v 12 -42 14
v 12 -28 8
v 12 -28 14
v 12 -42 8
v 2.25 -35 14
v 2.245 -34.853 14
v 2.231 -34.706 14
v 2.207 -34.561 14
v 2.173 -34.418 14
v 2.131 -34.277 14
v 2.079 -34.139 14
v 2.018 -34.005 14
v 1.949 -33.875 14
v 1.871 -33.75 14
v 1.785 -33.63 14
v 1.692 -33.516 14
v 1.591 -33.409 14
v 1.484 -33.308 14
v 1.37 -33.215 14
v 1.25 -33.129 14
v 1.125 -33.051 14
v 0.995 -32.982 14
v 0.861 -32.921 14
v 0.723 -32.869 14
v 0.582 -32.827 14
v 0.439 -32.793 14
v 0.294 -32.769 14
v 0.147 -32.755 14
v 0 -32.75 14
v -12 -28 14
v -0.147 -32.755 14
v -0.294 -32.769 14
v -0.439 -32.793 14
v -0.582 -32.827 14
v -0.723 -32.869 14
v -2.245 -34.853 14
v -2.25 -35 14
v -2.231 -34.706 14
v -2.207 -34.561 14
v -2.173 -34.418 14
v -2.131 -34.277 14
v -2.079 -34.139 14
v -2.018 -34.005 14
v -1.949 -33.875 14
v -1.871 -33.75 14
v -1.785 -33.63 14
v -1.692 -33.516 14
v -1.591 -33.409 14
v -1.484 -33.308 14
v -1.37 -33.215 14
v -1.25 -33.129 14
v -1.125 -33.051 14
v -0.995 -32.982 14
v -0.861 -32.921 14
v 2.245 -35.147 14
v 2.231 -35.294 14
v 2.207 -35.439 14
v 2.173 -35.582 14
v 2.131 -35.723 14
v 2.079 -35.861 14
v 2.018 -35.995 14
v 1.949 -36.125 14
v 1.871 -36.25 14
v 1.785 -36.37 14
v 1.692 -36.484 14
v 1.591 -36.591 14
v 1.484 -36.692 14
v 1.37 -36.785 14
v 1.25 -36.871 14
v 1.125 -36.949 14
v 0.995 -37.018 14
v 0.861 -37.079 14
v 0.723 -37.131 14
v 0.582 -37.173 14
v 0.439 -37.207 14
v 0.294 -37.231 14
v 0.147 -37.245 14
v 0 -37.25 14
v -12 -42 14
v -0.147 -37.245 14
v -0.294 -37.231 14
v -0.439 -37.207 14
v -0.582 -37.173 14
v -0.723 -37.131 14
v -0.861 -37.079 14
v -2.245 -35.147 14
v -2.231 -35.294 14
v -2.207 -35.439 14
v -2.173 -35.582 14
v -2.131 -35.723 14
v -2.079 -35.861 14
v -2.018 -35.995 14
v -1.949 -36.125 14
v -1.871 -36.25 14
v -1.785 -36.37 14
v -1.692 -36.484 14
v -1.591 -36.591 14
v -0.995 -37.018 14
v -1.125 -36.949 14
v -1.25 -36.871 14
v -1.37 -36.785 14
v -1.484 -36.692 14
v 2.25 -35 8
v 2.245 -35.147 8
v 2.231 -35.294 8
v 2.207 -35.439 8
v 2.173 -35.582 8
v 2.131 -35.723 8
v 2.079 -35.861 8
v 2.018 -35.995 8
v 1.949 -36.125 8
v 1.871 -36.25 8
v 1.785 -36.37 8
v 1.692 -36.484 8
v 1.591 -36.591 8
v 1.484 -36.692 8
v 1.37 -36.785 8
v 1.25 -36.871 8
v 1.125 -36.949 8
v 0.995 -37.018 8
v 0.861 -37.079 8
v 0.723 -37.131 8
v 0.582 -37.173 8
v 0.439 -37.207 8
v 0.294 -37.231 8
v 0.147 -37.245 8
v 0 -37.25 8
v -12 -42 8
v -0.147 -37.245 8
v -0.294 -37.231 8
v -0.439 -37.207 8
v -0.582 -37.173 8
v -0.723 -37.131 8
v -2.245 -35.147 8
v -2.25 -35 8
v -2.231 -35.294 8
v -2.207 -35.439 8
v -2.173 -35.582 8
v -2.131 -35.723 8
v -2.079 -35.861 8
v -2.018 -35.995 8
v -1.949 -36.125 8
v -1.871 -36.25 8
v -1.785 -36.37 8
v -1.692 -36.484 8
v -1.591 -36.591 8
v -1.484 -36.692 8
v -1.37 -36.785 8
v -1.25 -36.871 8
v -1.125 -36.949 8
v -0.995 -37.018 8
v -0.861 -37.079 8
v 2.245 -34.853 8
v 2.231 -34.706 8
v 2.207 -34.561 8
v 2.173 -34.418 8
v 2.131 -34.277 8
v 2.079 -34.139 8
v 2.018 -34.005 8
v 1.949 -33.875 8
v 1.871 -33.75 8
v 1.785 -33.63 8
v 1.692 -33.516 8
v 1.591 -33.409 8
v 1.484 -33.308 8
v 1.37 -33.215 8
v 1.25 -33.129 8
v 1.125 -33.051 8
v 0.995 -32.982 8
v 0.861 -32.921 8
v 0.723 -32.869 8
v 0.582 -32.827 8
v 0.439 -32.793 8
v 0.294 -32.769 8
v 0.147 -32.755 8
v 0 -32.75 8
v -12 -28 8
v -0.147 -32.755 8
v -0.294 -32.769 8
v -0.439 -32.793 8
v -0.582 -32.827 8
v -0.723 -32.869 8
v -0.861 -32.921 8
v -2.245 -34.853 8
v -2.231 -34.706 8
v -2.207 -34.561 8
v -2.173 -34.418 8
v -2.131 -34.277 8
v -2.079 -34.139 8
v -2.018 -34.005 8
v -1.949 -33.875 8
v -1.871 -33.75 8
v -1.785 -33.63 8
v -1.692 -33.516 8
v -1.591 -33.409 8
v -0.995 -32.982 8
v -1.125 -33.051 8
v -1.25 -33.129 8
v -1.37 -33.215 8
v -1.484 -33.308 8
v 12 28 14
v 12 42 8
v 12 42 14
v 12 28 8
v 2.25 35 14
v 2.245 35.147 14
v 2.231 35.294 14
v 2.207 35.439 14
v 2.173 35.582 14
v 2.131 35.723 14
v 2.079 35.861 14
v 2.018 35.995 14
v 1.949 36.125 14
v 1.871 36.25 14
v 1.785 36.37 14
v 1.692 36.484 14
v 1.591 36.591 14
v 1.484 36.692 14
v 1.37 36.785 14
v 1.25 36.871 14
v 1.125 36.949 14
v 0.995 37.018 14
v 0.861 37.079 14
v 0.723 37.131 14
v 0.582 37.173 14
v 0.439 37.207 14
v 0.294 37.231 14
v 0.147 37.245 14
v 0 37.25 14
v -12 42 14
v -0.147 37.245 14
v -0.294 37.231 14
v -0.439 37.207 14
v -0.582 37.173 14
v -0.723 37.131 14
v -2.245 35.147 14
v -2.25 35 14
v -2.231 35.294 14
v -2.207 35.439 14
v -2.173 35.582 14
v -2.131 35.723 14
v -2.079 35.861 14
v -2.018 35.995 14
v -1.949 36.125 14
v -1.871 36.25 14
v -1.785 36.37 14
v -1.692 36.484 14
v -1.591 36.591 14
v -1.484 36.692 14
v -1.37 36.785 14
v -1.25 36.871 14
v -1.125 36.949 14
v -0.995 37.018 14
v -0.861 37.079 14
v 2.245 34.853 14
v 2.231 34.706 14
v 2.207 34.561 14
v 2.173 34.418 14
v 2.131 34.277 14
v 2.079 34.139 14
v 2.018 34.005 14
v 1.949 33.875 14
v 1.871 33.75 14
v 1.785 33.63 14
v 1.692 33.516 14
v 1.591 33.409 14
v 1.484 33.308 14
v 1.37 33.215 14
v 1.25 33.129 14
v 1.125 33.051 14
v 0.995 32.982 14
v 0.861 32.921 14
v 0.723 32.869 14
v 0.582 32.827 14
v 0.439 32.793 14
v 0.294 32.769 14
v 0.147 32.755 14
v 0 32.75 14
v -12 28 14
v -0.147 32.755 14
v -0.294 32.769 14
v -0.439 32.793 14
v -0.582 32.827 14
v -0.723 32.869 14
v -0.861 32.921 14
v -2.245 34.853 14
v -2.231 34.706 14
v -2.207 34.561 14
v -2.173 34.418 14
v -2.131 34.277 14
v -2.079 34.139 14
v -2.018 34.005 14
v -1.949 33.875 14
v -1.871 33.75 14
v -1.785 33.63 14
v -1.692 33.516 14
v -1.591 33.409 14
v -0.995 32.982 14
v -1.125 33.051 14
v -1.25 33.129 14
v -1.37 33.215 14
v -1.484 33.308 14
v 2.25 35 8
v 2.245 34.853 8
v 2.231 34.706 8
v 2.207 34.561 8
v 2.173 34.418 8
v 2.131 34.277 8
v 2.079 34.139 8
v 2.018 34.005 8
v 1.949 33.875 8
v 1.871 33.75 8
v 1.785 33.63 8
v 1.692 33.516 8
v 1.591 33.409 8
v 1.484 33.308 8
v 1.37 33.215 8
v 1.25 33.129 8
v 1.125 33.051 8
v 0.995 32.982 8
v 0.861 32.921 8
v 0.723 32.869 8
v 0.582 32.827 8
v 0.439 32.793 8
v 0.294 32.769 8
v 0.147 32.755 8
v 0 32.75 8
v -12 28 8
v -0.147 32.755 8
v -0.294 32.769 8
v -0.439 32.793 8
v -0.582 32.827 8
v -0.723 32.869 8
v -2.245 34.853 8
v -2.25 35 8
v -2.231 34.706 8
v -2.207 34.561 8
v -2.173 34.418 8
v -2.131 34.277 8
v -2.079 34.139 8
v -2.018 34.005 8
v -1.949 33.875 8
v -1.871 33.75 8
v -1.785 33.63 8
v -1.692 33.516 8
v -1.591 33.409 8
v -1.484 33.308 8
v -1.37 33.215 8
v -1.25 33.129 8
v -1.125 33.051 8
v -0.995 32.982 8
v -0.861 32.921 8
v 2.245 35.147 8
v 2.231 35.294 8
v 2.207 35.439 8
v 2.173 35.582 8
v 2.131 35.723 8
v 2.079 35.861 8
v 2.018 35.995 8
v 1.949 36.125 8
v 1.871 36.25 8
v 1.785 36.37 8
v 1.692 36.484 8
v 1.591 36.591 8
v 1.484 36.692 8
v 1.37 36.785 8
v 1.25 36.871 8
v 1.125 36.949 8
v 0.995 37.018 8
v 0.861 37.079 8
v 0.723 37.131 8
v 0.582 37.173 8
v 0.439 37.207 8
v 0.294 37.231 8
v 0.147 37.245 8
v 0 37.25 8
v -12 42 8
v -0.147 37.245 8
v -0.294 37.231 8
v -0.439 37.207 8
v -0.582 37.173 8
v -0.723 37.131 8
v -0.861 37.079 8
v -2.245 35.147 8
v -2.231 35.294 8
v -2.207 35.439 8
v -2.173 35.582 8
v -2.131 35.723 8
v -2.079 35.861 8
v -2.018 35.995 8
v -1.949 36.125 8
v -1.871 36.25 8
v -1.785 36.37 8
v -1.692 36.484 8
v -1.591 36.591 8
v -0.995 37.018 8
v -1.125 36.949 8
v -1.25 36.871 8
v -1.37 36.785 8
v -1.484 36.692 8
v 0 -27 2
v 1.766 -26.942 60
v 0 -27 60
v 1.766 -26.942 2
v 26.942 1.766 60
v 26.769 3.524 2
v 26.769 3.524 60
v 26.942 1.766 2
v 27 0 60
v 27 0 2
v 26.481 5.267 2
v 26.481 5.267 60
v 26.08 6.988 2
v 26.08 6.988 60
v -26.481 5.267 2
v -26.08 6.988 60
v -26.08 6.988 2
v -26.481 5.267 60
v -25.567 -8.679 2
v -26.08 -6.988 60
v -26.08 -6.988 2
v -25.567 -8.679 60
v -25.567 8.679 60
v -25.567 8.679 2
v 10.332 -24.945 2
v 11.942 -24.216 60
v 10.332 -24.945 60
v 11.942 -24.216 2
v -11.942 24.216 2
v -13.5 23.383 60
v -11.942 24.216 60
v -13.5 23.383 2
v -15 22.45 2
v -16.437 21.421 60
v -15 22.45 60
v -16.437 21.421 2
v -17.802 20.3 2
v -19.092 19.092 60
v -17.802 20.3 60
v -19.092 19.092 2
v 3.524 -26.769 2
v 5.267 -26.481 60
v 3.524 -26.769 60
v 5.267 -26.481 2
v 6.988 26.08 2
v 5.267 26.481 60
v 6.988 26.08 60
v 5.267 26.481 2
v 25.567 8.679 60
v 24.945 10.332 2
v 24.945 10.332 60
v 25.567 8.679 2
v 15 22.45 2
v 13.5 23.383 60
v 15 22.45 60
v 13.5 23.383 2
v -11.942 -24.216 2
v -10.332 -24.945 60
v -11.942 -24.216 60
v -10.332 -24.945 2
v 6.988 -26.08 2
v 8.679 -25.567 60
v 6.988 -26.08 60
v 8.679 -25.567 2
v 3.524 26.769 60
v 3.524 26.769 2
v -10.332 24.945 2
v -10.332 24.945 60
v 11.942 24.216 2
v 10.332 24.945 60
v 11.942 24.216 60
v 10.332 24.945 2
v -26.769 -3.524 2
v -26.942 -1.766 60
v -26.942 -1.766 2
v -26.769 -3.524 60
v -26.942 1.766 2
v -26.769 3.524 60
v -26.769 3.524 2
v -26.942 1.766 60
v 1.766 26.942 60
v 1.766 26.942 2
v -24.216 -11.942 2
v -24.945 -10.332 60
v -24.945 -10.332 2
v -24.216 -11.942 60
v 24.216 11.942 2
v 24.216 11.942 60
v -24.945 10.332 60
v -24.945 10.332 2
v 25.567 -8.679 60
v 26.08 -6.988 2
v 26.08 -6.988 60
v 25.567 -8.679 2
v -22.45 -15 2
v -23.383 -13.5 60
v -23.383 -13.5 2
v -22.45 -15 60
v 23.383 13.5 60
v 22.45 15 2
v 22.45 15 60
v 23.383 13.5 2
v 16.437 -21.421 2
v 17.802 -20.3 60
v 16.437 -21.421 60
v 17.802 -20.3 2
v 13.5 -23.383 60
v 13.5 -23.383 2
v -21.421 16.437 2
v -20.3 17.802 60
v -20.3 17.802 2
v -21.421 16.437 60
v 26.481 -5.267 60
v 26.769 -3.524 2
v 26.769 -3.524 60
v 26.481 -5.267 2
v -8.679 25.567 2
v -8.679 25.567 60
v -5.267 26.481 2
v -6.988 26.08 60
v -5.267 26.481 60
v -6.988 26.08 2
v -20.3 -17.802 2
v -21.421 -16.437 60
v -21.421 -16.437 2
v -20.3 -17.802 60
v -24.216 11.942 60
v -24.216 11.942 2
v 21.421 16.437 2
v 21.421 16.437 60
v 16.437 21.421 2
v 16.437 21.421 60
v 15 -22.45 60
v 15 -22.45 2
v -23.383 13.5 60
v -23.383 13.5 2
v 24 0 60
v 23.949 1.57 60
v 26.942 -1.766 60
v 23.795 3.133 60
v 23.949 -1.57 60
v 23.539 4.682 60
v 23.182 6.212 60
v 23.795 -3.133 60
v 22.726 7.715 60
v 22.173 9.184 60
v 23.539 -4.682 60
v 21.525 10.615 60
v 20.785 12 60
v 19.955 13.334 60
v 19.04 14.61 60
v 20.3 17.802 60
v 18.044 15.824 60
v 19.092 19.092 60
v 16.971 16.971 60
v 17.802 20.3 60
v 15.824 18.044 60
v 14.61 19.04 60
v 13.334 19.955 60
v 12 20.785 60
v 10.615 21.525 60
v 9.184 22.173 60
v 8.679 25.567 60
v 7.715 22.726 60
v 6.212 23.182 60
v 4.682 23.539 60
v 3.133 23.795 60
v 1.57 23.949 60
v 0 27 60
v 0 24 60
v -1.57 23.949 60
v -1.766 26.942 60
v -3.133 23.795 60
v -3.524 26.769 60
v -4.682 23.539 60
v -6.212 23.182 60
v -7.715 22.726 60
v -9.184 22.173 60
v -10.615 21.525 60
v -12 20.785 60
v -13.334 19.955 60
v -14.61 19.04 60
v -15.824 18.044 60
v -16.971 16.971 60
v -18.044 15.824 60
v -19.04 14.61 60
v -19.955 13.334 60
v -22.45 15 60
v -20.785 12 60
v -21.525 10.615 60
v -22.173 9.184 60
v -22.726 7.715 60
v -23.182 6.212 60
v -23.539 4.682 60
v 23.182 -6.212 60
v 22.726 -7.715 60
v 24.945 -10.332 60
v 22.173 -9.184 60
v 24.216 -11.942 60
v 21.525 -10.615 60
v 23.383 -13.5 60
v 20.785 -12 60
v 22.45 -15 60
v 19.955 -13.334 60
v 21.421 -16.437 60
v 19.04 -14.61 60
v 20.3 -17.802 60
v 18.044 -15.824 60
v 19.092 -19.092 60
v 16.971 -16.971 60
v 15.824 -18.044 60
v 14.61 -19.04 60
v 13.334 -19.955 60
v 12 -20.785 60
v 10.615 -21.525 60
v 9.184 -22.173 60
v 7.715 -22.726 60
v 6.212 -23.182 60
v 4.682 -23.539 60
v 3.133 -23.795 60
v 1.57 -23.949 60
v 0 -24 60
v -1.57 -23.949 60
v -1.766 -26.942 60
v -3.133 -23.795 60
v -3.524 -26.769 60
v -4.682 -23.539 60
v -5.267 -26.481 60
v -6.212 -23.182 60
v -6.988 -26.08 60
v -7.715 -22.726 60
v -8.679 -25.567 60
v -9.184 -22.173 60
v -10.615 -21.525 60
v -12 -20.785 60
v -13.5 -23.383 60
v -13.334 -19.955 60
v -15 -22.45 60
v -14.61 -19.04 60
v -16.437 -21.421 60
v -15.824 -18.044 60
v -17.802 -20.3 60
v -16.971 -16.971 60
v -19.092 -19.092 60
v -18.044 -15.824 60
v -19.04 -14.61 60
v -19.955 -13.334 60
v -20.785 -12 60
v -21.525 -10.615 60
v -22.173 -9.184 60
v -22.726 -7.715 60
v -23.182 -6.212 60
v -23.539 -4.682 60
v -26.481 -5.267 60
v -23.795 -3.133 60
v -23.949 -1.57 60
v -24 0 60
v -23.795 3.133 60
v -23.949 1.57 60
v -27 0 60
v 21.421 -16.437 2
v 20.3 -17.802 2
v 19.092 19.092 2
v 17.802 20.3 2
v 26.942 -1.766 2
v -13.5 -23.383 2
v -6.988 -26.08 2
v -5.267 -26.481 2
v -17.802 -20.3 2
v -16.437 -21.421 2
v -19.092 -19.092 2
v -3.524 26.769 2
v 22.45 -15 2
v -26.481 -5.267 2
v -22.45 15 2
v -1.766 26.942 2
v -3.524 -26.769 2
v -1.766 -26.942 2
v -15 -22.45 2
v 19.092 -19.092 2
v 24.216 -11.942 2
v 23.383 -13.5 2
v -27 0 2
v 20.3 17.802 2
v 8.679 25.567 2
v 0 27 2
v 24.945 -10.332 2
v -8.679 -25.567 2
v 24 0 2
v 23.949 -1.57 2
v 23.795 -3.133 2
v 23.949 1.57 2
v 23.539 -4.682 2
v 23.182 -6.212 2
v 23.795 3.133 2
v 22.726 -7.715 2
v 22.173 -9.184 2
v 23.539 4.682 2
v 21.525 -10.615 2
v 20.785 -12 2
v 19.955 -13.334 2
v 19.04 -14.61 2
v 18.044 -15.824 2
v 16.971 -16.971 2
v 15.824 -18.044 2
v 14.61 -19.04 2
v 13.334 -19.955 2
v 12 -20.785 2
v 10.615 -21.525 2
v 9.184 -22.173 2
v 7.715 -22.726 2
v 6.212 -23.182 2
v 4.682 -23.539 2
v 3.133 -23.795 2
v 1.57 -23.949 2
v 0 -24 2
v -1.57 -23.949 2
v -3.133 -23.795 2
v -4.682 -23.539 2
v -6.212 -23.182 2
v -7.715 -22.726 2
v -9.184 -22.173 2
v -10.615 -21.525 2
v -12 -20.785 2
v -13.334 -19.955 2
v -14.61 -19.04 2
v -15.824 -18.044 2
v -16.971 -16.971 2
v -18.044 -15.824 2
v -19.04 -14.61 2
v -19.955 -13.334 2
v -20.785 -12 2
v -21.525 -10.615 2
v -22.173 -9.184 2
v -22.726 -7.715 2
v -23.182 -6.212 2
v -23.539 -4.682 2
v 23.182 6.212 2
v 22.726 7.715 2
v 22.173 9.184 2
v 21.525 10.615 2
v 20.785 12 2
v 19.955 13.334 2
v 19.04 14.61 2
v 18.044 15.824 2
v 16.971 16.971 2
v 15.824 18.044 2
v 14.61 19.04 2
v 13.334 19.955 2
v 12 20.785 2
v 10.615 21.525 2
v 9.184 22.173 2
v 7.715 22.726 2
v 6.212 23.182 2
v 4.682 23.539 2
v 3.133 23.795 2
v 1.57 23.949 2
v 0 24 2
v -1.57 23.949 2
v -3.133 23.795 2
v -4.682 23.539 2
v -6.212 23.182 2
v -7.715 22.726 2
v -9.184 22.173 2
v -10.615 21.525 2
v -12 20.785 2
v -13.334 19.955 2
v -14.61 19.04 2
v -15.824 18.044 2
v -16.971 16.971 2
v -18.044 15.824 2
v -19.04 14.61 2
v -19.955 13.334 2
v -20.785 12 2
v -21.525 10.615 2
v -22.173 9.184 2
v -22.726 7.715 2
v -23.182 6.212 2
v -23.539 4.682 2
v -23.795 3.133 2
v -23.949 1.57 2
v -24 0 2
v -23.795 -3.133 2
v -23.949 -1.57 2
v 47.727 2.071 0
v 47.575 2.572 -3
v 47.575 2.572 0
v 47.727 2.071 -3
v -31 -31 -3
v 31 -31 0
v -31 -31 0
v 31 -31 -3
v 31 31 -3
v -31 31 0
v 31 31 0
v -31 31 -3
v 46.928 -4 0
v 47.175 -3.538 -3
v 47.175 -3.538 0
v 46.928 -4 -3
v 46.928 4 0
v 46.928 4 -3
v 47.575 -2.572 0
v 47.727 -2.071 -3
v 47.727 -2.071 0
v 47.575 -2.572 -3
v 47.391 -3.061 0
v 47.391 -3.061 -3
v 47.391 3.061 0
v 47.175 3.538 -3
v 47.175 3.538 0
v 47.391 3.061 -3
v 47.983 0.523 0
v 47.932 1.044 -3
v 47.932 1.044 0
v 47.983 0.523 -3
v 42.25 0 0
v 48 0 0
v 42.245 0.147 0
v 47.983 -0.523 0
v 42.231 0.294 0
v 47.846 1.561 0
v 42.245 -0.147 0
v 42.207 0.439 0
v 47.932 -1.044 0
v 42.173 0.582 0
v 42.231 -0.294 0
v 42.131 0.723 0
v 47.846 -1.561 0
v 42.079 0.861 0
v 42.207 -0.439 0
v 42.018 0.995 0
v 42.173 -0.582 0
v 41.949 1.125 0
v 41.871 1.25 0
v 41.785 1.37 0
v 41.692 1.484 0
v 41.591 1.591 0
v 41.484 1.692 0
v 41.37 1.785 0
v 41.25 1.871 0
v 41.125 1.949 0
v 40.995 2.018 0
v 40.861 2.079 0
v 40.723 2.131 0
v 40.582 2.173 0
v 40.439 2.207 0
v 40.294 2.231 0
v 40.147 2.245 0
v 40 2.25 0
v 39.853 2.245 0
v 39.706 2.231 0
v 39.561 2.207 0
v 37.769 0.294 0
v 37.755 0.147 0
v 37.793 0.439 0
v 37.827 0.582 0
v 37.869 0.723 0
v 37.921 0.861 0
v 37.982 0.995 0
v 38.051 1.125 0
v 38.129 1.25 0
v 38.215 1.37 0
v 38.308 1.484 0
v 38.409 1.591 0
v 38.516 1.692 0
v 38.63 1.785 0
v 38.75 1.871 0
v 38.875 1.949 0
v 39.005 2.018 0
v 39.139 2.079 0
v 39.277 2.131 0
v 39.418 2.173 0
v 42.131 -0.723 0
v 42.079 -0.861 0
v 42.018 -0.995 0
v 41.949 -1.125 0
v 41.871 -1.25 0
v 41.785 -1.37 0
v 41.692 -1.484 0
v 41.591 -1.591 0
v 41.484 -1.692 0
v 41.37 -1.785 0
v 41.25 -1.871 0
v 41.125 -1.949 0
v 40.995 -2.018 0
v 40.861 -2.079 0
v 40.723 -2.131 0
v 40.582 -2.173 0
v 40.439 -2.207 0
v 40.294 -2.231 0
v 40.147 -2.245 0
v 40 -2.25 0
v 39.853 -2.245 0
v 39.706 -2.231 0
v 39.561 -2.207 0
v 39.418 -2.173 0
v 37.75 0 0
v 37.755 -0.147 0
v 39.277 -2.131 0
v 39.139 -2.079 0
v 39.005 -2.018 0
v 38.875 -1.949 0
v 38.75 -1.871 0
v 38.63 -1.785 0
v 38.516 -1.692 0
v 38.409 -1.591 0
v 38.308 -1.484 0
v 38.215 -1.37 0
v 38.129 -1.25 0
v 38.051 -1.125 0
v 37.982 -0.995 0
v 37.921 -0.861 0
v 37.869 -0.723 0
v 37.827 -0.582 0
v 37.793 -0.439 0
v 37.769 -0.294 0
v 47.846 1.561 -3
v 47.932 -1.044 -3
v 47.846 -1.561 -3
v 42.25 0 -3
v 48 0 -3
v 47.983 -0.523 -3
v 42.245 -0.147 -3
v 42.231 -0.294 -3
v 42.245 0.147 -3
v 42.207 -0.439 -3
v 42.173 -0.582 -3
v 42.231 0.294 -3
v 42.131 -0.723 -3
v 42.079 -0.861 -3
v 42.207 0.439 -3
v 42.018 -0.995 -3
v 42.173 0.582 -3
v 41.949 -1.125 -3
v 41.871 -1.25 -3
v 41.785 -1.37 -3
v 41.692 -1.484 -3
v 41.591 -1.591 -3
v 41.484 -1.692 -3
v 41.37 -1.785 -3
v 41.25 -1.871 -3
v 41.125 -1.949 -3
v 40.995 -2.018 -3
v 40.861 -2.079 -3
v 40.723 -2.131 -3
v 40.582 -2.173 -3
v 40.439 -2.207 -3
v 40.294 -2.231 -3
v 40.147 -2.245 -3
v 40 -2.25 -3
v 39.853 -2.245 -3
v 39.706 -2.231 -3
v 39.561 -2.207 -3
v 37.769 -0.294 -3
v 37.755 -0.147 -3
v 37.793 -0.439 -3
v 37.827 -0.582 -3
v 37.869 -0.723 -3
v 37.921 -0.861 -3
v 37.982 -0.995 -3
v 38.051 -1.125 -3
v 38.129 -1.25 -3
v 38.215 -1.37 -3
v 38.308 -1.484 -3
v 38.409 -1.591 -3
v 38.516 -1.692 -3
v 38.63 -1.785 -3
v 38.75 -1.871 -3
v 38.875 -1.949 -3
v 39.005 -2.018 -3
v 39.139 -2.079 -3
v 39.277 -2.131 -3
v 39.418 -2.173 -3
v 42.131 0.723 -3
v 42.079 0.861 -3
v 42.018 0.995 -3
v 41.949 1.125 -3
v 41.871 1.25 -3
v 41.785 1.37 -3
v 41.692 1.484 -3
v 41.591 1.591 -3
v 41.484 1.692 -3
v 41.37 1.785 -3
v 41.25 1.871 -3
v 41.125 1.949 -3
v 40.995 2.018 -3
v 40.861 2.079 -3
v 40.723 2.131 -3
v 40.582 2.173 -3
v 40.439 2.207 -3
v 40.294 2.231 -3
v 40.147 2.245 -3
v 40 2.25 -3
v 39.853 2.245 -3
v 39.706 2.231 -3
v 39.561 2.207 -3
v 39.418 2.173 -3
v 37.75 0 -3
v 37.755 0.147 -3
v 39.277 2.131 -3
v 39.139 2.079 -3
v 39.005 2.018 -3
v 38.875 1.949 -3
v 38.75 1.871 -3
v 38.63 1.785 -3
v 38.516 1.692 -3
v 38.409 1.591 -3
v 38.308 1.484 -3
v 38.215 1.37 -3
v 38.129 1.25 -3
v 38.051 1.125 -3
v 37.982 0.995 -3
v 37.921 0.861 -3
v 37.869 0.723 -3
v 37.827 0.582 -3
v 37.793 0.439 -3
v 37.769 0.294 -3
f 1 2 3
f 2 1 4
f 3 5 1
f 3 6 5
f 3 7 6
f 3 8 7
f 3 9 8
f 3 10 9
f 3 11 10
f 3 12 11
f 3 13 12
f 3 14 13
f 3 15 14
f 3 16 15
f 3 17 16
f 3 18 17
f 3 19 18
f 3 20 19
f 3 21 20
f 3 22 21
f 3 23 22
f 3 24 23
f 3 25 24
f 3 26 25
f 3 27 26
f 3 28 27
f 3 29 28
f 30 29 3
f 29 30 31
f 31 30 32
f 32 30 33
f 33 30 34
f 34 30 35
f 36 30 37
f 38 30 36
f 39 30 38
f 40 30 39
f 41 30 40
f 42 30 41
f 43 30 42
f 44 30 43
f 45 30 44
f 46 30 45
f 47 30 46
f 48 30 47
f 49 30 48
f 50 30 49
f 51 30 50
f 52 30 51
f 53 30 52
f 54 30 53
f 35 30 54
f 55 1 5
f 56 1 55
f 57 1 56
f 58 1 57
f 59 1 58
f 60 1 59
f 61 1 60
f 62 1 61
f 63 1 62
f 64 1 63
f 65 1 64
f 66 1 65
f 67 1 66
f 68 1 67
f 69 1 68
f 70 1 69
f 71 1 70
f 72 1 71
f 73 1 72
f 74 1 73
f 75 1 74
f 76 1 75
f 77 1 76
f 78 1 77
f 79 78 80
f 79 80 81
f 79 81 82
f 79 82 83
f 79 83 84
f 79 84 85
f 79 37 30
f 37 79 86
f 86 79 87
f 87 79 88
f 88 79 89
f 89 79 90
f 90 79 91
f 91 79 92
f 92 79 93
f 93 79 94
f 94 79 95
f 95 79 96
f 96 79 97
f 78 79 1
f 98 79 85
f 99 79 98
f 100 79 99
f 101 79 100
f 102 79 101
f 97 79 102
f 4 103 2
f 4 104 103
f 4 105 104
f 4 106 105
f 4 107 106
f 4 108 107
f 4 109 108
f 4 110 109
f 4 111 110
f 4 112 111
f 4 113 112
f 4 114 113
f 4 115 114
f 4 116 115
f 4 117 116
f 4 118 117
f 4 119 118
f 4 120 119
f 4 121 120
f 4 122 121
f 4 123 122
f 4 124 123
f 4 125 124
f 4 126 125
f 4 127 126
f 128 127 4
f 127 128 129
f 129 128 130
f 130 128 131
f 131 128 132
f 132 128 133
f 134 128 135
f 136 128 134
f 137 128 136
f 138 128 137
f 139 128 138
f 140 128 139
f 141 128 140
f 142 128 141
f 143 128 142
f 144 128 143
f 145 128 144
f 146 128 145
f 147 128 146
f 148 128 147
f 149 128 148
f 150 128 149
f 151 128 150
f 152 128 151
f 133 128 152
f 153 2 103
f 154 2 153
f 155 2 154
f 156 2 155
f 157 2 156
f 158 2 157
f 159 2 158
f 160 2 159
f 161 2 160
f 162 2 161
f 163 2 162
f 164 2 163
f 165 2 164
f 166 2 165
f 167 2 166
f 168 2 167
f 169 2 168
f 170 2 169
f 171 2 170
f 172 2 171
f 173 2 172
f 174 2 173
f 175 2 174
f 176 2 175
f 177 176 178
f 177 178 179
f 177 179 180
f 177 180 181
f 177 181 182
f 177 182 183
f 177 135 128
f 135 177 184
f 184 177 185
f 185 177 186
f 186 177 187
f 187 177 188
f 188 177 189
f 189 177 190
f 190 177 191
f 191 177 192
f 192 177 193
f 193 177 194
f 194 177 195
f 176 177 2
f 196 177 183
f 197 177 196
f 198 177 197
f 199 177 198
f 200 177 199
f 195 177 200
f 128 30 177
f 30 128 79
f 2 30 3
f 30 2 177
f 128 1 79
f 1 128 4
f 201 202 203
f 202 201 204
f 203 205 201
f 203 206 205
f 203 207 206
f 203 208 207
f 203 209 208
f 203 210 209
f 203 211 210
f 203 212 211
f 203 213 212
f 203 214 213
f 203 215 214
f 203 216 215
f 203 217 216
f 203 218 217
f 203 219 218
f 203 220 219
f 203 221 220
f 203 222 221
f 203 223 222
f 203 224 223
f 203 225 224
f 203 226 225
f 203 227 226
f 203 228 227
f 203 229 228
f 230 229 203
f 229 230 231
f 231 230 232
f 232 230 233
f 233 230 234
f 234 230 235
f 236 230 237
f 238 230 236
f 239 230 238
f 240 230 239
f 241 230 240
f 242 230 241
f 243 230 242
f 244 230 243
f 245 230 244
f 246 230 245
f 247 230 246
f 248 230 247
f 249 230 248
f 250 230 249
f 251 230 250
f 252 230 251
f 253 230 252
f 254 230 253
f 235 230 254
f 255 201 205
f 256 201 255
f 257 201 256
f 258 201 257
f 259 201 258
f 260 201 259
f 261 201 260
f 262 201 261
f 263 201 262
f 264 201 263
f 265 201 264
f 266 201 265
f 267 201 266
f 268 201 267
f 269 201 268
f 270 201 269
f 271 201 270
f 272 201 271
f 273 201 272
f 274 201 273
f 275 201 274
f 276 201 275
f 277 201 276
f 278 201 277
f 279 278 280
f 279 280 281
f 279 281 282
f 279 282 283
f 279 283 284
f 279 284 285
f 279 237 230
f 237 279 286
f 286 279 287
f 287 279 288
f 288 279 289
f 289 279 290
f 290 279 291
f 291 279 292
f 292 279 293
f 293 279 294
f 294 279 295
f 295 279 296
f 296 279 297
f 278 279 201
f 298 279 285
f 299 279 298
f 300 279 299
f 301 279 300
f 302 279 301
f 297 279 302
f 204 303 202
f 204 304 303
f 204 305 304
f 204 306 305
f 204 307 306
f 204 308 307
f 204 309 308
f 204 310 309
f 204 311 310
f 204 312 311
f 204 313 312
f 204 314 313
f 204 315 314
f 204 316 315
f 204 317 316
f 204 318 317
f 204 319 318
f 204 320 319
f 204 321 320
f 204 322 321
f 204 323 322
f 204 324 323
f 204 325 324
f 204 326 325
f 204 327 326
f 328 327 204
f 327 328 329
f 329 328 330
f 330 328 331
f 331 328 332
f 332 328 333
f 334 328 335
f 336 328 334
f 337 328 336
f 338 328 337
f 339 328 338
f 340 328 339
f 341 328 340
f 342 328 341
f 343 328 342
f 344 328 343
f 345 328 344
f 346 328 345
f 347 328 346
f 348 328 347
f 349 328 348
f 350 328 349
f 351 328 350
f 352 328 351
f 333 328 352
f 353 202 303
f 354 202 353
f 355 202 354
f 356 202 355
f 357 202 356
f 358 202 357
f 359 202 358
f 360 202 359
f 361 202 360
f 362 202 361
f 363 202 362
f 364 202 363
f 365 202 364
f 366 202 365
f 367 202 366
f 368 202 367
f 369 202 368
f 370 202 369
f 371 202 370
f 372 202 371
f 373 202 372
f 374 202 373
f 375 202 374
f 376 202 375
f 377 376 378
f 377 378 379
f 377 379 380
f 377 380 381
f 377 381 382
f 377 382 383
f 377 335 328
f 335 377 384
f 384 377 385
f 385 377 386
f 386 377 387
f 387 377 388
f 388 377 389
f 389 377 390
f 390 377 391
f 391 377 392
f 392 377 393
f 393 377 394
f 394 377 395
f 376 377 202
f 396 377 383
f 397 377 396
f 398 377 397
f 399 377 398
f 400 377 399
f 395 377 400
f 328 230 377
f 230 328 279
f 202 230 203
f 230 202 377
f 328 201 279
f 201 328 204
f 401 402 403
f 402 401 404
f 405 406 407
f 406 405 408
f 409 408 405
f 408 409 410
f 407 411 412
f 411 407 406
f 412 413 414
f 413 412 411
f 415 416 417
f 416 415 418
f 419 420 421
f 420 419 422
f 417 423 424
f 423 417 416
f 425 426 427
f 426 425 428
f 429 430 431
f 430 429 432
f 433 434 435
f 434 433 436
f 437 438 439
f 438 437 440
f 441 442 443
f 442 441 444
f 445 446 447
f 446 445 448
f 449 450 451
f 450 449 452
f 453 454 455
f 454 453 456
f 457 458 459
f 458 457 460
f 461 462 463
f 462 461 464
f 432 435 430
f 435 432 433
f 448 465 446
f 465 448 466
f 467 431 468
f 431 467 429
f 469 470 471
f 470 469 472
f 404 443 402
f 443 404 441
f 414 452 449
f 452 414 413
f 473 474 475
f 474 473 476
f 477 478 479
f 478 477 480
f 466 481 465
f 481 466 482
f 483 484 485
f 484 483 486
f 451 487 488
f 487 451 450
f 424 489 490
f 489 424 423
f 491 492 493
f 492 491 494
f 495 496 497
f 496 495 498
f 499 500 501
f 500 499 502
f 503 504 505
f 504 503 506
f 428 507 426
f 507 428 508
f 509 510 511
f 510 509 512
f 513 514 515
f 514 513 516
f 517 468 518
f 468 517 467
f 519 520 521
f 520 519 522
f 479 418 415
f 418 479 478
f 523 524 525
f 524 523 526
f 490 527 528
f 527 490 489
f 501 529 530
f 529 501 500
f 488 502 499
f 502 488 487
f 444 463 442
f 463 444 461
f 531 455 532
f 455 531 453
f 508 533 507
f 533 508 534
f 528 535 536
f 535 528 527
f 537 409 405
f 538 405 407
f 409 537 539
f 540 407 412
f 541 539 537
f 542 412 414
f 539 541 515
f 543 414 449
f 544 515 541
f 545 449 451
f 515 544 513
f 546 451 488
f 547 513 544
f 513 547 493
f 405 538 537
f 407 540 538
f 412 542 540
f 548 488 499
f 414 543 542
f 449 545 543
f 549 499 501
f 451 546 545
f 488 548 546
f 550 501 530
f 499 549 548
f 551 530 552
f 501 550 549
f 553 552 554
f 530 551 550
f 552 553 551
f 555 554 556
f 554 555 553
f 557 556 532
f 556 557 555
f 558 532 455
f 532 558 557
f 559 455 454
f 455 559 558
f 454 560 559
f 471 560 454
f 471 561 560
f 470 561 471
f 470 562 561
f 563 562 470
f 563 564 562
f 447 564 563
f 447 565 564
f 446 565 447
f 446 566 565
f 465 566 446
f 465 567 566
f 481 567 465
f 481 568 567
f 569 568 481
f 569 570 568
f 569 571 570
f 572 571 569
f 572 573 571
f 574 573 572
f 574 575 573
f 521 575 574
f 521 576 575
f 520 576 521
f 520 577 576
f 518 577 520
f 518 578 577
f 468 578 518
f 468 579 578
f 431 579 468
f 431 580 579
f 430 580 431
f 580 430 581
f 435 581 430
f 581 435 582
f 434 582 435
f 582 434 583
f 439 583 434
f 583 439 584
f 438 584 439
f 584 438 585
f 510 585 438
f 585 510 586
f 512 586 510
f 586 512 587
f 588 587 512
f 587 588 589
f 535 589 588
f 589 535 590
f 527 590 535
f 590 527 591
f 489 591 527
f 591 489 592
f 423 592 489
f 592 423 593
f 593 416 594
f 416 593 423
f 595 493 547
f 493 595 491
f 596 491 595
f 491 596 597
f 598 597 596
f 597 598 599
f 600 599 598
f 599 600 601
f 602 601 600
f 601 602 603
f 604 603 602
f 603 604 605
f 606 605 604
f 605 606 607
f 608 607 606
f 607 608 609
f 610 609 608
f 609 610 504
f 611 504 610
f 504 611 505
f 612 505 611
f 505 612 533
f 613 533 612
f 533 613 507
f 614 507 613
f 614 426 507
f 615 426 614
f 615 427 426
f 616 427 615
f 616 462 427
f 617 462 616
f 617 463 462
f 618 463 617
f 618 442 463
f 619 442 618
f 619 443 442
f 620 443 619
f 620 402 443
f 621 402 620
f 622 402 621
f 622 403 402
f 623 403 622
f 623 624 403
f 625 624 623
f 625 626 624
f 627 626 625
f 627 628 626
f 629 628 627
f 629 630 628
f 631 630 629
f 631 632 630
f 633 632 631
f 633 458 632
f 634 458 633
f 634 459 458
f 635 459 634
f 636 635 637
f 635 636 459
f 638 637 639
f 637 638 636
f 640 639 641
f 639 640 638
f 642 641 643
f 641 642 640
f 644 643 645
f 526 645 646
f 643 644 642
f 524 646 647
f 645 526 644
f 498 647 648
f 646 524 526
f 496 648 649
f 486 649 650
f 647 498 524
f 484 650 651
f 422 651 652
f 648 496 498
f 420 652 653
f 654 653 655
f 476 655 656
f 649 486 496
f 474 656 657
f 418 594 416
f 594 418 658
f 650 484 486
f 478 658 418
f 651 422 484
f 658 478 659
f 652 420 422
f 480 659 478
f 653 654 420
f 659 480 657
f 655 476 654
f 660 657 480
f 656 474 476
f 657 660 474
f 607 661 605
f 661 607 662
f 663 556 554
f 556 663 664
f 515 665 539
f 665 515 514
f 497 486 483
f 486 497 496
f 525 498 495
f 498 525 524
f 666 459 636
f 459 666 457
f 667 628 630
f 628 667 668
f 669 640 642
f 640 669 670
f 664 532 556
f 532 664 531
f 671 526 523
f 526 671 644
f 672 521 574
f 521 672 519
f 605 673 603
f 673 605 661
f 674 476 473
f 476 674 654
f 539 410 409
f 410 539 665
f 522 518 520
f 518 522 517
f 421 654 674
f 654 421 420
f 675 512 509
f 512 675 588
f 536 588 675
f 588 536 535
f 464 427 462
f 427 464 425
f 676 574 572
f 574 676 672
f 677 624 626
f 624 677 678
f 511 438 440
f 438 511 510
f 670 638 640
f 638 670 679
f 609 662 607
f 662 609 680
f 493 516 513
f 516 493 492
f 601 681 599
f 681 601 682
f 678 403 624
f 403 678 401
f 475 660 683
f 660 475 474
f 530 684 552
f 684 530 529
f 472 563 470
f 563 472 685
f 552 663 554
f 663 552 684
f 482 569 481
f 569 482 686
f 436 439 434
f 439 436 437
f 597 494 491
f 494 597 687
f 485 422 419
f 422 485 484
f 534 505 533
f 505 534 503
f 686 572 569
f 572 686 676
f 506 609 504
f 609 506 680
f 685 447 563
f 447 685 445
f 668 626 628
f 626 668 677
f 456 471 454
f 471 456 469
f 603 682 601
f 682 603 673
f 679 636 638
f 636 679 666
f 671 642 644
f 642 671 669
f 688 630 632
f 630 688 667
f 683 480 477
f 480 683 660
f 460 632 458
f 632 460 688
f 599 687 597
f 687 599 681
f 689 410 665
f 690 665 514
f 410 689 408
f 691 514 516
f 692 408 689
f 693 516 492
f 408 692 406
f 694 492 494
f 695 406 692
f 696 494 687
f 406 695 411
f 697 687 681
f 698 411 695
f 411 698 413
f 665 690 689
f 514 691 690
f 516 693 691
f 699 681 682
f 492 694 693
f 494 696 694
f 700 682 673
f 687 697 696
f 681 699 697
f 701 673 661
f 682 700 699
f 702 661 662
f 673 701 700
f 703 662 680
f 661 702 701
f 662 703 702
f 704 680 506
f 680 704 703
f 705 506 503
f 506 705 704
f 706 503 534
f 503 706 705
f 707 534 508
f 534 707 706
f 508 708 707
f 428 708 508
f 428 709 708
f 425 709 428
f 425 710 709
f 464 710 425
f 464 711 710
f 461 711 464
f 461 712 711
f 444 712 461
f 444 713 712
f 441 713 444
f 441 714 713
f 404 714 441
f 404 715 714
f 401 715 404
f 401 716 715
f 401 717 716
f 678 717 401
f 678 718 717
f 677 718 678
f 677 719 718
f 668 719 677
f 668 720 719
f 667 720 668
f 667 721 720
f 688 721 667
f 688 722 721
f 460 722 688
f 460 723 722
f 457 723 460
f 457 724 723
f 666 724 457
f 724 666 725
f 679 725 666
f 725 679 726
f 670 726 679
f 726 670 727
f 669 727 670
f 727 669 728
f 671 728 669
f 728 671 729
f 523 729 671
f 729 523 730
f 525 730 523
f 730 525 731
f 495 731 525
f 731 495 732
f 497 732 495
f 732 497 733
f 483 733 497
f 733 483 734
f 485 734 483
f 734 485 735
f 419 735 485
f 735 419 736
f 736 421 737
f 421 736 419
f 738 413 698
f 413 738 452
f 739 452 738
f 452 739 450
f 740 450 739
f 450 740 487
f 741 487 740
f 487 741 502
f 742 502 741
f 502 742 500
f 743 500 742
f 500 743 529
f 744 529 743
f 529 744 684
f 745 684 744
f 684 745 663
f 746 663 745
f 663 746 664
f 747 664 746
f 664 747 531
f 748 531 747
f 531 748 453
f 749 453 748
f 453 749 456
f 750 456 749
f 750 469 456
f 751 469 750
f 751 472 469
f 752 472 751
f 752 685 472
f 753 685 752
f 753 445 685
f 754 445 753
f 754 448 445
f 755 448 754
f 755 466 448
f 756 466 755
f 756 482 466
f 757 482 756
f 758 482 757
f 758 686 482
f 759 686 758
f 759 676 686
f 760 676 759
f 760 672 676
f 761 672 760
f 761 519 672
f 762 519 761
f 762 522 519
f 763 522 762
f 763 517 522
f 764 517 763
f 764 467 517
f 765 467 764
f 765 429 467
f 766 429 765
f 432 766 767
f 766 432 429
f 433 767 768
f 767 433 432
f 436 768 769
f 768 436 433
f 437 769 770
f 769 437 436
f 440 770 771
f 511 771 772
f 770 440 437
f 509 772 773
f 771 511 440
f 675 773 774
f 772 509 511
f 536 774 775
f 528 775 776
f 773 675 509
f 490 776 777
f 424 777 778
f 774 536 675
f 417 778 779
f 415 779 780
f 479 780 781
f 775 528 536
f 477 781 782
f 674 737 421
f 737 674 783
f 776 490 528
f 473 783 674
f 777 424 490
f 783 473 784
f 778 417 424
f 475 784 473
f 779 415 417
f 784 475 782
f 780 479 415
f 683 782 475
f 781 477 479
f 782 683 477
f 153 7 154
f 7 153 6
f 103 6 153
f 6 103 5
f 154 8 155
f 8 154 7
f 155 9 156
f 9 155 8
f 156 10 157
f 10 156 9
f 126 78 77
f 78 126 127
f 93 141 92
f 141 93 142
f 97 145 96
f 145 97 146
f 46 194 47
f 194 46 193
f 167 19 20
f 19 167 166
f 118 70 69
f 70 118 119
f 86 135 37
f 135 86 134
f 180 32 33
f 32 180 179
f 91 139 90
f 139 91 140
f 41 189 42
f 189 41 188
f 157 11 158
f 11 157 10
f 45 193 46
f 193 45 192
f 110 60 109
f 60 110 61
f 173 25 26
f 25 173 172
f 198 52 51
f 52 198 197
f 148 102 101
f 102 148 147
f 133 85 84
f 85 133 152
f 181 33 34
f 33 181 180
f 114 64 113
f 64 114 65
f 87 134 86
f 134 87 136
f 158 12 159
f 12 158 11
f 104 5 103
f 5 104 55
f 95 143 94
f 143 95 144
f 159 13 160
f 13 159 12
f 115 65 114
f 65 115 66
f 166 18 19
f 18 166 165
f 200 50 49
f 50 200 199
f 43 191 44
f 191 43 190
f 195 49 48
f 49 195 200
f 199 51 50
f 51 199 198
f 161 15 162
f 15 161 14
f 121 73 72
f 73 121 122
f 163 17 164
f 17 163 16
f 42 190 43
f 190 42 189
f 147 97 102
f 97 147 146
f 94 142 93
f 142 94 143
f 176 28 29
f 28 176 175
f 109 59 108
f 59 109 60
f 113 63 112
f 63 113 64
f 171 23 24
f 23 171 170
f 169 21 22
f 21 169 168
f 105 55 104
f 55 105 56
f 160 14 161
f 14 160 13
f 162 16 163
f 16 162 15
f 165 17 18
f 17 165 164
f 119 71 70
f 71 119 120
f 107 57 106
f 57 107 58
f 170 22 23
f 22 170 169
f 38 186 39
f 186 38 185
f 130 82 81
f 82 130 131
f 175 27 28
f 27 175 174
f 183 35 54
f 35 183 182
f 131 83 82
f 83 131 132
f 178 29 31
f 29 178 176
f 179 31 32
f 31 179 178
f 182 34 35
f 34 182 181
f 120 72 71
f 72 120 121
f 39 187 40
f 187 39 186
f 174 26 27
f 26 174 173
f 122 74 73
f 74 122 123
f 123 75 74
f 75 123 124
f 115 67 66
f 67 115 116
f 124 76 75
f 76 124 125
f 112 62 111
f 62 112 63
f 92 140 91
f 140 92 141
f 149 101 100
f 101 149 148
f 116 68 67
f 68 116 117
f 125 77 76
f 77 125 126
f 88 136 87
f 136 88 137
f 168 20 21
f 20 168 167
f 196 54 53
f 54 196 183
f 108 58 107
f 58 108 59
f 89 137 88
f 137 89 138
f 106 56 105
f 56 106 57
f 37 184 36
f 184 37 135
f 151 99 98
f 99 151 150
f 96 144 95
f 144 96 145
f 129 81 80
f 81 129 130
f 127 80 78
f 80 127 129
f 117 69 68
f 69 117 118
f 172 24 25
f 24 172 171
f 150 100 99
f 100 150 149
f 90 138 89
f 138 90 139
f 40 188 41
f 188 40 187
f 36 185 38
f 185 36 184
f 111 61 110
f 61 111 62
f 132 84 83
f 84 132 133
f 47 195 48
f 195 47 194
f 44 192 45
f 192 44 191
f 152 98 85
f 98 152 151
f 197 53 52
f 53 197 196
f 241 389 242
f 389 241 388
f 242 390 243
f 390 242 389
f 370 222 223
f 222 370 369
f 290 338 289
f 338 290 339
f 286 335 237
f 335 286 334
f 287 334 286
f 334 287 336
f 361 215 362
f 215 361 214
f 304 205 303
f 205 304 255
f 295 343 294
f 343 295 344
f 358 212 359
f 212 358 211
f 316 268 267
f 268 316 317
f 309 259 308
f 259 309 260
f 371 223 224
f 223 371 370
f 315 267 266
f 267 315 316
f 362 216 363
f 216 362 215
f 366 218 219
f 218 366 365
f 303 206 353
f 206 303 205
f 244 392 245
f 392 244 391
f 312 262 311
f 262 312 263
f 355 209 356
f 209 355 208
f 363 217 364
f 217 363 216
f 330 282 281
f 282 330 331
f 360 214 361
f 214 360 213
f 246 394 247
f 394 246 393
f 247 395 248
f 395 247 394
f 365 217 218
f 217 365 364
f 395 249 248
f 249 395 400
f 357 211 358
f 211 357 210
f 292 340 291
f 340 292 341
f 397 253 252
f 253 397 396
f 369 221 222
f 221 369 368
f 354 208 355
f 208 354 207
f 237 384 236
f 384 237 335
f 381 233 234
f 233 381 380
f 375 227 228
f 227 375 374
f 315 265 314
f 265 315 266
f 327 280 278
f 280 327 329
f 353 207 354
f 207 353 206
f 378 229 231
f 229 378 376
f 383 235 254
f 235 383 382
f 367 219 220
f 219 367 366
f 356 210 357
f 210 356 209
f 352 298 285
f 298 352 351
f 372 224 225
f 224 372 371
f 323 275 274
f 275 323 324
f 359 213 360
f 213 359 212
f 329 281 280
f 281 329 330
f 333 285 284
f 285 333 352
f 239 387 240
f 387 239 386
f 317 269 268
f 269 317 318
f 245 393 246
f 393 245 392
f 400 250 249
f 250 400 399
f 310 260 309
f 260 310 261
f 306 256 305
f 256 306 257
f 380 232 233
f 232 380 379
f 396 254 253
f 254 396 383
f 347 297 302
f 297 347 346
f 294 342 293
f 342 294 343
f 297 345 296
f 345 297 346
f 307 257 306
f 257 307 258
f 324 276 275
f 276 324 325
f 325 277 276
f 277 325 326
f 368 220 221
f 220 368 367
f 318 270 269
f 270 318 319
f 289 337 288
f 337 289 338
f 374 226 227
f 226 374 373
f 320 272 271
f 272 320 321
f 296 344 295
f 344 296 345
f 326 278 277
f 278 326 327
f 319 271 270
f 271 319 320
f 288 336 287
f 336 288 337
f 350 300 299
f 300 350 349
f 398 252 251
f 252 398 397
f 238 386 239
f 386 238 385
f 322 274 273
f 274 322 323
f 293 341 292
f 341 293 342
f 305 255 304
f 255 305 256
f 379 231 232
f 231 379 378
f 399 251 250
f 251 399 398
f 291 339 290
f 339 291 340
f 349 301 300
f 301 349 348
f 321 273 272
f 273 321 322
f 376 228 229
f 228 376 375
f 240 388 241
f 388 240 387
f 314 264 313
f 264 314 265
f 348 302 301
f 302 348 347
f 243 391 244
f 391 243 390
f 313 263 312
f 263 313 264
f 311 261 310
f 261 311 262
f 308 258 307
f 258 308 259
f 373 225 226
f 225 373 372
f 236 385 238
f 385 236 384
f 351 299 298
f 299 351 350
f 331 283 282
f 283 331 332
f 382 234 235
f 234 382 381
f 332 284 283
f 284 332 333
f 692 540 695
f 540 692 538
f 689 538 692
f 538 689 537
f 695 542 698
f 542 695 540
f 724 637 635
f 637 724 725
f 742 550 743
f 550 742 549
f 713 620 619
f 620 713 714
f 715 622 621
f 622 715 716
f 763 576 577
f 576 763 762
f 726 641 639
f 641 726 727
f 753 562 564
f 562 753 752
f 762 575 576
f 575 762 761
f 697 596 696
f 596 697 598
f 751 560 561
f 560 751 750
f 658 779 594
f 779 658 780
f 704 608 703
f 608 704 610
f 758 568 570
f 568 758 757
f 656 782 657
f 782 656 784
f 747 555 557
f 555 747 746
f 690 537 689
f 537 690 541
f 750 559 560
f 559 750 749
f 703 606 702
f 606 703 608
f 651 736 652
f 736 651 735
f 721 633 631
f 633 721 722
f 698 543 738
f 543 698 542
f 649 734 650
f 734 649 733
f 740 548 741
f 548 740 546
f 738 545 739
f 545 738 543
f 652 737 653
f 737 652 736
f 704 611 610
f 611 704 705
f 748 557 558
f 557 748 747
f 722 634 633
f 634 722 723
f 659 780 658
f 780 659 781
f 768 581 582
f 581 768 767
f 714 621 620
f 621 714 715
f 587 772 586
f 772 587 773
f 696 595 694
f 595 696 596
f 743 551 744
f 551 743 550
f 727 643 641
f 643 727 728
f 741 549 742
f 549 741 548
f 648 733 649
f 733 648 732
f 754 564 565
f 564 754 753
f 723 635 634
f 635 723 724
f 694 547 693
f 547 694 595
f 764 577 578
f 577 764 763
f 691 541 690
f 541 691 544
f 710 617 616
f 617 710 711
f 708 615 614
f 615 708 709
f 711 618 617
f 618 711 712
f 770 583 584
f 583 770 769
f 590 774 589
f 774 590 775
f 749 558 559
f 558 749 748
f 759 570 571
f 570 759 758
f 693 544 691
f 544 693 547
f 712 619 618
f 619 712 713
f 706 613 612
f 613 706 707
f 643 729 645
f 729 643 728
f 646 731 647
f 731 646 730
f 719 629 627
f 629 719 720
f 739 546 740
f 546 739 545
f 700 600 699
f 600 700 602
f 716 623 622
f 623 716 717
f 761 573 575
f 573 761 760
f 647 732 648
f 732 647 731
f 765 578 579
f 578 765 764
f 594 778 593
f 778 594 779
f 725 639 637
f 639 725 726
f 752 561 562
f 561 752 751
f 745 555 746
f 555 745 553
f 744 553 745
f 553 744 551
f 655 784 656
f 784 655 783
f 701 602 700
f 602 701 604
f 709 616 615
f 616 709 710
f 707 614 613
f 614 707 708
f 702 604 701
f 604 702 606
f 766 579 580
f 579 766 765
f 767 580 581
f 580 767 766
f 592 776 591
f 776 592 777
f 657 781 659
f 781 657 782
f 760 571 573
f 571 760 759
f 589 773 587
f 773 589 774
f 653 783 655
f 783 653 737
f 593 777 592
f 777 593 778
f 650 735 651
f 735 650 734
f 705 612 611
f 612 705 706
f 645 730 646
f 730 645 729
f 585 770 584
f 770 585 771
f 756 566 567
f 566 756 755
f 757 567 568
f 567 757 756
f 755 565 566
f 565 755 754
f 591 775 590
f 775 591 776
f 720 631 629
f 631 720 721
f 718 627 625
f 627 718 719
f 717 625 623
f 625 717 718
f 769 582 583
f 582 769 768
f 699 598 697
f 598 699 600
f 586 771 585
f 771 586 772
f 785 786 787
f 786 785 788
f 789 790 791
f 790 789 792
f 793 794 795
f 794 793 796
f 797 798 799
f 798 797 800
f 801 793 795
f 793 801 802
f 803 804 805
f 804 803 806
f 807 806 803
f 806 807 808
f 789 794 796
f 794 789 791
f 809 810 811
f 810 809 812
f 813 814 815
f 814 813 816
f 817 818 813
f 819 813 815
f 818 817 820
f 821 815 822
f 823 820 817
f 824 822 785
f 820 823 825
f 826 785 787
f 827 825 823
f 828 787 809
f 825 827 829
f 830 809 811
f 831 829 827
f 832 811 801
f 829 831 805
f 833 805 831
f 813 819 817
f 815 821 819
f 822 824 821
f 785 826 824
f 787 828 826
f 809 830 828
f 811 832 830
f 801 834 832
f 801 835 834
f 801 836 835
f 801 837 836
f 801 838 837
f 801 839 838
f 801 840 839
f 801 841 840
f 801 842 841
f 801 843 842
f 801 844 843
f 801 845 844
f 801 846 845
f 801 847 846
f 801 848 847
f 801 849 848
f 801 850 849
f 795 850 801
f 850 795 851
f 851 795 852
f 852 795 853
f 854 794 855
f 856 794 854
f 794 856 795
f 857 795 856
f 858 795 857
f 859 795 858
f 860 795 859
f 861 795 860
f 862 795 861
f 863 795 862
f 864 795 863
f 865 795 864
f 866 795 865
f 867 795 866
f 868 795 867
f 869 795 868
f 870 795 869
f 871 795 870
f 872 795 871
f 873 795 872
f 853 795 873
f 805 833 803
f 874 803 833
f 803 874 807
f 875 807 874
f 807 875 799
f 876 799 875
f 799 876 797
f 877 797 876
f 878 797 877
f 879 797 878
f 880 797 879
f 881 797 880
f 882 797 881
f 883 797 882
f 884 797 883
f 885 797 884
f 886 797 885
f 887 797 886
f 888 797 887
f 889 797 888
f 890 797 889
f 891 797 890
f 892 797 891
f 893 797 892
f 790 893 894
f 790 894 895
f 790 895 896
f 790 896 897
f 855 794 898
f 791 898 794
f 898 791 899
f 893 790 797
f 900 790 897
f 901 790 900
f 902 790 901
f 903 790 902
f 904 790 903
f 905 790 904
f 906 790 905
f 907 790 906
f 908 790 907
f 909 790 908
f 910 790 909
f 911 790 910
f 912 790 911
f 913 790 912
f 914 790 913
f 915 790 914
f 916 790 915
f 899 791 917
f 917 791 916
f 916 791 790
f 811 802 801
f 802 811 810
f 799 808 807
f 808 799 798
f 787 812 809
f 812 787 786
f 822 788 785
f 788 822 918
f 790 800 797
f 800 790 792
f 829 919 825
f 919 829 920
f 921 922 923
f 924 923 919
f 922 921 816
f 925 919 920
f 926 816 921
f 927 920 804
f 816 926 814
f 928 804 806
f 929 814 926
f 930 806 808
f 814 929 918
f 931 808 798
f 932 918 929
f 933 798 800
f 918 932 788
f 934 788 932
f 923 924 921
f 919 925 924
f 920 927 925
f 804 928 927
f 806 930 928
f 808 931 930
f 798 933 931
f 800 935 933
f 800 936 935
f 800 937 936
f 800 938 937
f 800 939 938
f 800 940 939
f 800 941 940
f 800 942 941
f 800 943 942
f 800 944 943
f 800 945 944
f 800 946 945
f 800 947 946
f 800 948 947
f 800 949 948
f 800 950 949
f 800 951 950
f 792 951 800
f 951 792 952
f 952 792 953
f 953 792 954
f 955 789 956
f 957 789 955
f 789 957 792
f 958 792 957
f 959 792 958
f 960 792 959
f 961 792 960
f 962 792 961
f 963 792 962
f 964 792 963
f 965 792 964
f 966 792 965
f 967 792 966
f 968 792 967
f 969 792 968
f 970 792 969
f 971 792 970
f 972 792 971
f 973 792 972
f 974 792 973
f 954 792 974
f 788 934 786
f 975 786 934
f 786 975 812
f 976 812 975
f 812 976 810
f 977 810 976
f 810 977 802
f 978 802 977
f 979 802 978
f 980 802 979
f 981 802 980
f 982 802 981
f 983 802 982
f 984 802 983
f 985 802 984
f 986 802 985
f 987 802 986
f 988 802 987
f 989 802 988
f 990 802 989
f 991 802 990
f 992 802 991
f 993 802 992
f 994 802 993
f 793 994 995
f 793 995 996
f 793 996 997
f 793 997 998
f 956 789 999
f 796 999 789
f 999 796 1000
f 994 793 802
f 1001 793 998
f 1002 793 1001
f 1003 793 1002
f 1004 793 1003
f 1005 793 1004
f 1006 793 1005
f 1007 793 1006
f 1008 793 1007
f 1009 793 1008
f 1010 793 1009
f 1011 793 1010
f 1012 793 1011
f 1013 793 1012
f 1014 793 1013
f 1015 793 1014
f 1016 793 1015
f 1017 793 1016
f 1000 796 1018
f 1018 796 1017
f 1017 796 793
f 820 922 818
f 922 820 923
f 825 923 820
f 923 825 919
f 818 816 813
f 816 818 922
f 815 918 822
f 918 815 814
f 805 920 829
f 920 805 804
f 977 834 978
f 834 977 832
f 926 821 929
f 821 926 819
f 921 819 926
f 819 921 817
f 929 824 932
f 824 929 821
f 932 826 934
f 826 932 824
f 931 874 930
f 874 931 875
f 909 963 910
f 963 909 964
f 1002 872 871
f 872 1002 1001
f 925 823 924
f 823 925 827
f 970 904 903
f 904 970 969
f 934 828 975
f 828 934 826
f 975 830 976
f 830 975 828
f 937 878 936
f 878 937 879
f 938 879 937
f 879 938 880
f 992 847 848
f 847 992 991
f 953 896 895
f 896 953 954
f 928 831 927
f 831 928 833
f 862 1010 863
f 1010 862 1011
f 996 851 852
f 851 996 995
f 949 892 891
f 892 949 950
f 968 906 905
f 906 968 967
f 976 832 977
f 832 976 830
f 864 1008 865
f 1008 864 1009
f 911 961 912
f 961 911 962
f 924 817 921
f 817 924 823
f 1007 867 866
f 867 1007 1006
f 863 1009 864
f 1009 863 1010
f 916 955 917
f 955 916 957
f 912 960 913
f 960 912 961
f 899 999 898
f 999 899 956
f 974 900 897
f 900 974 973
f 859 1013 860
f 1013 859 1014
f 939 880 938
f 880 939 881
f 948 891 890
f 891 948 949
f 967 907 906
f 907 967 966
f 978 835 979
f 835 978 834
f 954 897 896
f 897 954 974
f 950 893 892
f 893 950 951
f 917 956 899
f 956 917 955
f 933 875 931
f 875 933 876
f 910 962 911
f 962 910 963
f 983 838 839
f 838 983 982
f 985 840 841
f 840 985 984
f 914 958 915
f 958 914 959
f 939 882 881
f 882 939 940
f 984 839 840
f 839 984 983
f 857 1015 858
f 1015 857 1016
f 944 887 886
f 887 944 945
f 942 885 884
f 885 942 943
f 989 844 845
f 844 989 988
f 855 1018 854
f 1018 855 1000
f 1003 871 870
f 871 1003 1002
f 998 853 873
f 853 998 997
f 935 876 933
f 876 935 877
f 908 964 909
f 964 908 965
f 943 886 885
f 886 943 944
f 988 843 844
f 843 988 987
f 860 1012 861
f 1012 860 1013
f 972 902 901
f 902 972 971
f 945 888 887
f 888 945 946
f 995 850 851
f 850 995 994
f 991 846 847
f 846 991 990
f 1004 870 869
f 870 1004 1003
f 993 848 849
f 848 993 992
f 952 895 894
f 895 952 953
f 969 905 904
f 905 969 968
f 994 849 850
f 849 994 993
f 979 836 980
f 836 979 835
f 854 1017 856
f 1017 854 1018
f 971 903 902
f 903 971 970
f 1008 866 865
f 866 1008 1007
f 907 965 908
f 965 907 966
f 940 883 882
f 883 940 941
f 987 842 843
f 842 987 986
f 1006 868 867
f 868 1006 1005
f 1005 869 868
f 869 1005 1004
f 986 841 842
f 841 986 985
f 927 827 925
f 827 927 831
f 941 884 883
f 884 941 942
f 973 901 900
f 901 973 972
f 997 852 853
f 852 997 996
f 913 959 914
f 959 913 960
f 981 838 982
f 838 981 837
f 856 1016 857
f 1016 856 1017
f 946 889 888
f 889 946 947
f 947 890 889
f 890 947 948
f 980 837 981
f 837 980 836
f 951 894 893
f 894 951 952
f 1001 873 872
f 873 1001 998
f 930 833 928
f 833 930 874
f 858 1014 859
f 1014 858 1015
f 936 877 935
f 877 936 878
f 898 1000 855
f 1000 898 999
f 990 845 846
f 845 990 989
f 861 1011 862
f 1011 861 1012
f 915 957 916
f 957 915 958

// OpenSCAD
// Concept only: millimetres, one ball; measure servo and fabricate/test before use.
ball_d = 45;       // Rulebook payload maximum diameter; design for the largest ball.
clearance = 3;     // Diametral allowance, must be checked after printing.
wall = 3;
height = 58;
plate_t = 3;
pivot_x = 40;
open_angle = 0;    // 0 closed, 120 open; CAD angle is not a calibrated PWM command.
$fn = 96;
bore = ball_d + clearance;
assert(bore > ball_d && height > ball_d);
// Tube remains fixed; two mounting ears receive M4 clearance holes.
color("steelblue") difference() {
    union() {
        translate([0,0,2]) cylinder(h=height,d=bore+2*wall);
        for (y=[-35,35]) translate([-12,y-7,8]) cube([24,14,6]);
    }
    translate([0,0,1]) cylinder(h=height+2,d=bore);
    for (y=[-35,35]) translate([0,y,7]) cylinder(h=8,d=4.5);
}
// Rotating shelf, shaft parallel to tube axis. Bracket/shaft bearings are not modeled.
color("orange") translate([pivot_x,0,0]) rotate([0,0,open_angle])
    translate([-pivot_x,0,-plate_t]) difference() {
        hull() {
            translate([-31,-31,0]) cube([62,62,plate_t]);
            translate([pivot_x,0,0]) cylinder(h=plate_t,d=16);
        }
        translate([pivot_x,0,-1]) cylinder(h=plate_t+2,d=4.5);
    }
// Display ball, excluded from fabricated geometry when preview is disabled.
if ($preview) color([1,1,1,.5]) translate([0,0,ball_d/2]) sphere(d=ball_d);
